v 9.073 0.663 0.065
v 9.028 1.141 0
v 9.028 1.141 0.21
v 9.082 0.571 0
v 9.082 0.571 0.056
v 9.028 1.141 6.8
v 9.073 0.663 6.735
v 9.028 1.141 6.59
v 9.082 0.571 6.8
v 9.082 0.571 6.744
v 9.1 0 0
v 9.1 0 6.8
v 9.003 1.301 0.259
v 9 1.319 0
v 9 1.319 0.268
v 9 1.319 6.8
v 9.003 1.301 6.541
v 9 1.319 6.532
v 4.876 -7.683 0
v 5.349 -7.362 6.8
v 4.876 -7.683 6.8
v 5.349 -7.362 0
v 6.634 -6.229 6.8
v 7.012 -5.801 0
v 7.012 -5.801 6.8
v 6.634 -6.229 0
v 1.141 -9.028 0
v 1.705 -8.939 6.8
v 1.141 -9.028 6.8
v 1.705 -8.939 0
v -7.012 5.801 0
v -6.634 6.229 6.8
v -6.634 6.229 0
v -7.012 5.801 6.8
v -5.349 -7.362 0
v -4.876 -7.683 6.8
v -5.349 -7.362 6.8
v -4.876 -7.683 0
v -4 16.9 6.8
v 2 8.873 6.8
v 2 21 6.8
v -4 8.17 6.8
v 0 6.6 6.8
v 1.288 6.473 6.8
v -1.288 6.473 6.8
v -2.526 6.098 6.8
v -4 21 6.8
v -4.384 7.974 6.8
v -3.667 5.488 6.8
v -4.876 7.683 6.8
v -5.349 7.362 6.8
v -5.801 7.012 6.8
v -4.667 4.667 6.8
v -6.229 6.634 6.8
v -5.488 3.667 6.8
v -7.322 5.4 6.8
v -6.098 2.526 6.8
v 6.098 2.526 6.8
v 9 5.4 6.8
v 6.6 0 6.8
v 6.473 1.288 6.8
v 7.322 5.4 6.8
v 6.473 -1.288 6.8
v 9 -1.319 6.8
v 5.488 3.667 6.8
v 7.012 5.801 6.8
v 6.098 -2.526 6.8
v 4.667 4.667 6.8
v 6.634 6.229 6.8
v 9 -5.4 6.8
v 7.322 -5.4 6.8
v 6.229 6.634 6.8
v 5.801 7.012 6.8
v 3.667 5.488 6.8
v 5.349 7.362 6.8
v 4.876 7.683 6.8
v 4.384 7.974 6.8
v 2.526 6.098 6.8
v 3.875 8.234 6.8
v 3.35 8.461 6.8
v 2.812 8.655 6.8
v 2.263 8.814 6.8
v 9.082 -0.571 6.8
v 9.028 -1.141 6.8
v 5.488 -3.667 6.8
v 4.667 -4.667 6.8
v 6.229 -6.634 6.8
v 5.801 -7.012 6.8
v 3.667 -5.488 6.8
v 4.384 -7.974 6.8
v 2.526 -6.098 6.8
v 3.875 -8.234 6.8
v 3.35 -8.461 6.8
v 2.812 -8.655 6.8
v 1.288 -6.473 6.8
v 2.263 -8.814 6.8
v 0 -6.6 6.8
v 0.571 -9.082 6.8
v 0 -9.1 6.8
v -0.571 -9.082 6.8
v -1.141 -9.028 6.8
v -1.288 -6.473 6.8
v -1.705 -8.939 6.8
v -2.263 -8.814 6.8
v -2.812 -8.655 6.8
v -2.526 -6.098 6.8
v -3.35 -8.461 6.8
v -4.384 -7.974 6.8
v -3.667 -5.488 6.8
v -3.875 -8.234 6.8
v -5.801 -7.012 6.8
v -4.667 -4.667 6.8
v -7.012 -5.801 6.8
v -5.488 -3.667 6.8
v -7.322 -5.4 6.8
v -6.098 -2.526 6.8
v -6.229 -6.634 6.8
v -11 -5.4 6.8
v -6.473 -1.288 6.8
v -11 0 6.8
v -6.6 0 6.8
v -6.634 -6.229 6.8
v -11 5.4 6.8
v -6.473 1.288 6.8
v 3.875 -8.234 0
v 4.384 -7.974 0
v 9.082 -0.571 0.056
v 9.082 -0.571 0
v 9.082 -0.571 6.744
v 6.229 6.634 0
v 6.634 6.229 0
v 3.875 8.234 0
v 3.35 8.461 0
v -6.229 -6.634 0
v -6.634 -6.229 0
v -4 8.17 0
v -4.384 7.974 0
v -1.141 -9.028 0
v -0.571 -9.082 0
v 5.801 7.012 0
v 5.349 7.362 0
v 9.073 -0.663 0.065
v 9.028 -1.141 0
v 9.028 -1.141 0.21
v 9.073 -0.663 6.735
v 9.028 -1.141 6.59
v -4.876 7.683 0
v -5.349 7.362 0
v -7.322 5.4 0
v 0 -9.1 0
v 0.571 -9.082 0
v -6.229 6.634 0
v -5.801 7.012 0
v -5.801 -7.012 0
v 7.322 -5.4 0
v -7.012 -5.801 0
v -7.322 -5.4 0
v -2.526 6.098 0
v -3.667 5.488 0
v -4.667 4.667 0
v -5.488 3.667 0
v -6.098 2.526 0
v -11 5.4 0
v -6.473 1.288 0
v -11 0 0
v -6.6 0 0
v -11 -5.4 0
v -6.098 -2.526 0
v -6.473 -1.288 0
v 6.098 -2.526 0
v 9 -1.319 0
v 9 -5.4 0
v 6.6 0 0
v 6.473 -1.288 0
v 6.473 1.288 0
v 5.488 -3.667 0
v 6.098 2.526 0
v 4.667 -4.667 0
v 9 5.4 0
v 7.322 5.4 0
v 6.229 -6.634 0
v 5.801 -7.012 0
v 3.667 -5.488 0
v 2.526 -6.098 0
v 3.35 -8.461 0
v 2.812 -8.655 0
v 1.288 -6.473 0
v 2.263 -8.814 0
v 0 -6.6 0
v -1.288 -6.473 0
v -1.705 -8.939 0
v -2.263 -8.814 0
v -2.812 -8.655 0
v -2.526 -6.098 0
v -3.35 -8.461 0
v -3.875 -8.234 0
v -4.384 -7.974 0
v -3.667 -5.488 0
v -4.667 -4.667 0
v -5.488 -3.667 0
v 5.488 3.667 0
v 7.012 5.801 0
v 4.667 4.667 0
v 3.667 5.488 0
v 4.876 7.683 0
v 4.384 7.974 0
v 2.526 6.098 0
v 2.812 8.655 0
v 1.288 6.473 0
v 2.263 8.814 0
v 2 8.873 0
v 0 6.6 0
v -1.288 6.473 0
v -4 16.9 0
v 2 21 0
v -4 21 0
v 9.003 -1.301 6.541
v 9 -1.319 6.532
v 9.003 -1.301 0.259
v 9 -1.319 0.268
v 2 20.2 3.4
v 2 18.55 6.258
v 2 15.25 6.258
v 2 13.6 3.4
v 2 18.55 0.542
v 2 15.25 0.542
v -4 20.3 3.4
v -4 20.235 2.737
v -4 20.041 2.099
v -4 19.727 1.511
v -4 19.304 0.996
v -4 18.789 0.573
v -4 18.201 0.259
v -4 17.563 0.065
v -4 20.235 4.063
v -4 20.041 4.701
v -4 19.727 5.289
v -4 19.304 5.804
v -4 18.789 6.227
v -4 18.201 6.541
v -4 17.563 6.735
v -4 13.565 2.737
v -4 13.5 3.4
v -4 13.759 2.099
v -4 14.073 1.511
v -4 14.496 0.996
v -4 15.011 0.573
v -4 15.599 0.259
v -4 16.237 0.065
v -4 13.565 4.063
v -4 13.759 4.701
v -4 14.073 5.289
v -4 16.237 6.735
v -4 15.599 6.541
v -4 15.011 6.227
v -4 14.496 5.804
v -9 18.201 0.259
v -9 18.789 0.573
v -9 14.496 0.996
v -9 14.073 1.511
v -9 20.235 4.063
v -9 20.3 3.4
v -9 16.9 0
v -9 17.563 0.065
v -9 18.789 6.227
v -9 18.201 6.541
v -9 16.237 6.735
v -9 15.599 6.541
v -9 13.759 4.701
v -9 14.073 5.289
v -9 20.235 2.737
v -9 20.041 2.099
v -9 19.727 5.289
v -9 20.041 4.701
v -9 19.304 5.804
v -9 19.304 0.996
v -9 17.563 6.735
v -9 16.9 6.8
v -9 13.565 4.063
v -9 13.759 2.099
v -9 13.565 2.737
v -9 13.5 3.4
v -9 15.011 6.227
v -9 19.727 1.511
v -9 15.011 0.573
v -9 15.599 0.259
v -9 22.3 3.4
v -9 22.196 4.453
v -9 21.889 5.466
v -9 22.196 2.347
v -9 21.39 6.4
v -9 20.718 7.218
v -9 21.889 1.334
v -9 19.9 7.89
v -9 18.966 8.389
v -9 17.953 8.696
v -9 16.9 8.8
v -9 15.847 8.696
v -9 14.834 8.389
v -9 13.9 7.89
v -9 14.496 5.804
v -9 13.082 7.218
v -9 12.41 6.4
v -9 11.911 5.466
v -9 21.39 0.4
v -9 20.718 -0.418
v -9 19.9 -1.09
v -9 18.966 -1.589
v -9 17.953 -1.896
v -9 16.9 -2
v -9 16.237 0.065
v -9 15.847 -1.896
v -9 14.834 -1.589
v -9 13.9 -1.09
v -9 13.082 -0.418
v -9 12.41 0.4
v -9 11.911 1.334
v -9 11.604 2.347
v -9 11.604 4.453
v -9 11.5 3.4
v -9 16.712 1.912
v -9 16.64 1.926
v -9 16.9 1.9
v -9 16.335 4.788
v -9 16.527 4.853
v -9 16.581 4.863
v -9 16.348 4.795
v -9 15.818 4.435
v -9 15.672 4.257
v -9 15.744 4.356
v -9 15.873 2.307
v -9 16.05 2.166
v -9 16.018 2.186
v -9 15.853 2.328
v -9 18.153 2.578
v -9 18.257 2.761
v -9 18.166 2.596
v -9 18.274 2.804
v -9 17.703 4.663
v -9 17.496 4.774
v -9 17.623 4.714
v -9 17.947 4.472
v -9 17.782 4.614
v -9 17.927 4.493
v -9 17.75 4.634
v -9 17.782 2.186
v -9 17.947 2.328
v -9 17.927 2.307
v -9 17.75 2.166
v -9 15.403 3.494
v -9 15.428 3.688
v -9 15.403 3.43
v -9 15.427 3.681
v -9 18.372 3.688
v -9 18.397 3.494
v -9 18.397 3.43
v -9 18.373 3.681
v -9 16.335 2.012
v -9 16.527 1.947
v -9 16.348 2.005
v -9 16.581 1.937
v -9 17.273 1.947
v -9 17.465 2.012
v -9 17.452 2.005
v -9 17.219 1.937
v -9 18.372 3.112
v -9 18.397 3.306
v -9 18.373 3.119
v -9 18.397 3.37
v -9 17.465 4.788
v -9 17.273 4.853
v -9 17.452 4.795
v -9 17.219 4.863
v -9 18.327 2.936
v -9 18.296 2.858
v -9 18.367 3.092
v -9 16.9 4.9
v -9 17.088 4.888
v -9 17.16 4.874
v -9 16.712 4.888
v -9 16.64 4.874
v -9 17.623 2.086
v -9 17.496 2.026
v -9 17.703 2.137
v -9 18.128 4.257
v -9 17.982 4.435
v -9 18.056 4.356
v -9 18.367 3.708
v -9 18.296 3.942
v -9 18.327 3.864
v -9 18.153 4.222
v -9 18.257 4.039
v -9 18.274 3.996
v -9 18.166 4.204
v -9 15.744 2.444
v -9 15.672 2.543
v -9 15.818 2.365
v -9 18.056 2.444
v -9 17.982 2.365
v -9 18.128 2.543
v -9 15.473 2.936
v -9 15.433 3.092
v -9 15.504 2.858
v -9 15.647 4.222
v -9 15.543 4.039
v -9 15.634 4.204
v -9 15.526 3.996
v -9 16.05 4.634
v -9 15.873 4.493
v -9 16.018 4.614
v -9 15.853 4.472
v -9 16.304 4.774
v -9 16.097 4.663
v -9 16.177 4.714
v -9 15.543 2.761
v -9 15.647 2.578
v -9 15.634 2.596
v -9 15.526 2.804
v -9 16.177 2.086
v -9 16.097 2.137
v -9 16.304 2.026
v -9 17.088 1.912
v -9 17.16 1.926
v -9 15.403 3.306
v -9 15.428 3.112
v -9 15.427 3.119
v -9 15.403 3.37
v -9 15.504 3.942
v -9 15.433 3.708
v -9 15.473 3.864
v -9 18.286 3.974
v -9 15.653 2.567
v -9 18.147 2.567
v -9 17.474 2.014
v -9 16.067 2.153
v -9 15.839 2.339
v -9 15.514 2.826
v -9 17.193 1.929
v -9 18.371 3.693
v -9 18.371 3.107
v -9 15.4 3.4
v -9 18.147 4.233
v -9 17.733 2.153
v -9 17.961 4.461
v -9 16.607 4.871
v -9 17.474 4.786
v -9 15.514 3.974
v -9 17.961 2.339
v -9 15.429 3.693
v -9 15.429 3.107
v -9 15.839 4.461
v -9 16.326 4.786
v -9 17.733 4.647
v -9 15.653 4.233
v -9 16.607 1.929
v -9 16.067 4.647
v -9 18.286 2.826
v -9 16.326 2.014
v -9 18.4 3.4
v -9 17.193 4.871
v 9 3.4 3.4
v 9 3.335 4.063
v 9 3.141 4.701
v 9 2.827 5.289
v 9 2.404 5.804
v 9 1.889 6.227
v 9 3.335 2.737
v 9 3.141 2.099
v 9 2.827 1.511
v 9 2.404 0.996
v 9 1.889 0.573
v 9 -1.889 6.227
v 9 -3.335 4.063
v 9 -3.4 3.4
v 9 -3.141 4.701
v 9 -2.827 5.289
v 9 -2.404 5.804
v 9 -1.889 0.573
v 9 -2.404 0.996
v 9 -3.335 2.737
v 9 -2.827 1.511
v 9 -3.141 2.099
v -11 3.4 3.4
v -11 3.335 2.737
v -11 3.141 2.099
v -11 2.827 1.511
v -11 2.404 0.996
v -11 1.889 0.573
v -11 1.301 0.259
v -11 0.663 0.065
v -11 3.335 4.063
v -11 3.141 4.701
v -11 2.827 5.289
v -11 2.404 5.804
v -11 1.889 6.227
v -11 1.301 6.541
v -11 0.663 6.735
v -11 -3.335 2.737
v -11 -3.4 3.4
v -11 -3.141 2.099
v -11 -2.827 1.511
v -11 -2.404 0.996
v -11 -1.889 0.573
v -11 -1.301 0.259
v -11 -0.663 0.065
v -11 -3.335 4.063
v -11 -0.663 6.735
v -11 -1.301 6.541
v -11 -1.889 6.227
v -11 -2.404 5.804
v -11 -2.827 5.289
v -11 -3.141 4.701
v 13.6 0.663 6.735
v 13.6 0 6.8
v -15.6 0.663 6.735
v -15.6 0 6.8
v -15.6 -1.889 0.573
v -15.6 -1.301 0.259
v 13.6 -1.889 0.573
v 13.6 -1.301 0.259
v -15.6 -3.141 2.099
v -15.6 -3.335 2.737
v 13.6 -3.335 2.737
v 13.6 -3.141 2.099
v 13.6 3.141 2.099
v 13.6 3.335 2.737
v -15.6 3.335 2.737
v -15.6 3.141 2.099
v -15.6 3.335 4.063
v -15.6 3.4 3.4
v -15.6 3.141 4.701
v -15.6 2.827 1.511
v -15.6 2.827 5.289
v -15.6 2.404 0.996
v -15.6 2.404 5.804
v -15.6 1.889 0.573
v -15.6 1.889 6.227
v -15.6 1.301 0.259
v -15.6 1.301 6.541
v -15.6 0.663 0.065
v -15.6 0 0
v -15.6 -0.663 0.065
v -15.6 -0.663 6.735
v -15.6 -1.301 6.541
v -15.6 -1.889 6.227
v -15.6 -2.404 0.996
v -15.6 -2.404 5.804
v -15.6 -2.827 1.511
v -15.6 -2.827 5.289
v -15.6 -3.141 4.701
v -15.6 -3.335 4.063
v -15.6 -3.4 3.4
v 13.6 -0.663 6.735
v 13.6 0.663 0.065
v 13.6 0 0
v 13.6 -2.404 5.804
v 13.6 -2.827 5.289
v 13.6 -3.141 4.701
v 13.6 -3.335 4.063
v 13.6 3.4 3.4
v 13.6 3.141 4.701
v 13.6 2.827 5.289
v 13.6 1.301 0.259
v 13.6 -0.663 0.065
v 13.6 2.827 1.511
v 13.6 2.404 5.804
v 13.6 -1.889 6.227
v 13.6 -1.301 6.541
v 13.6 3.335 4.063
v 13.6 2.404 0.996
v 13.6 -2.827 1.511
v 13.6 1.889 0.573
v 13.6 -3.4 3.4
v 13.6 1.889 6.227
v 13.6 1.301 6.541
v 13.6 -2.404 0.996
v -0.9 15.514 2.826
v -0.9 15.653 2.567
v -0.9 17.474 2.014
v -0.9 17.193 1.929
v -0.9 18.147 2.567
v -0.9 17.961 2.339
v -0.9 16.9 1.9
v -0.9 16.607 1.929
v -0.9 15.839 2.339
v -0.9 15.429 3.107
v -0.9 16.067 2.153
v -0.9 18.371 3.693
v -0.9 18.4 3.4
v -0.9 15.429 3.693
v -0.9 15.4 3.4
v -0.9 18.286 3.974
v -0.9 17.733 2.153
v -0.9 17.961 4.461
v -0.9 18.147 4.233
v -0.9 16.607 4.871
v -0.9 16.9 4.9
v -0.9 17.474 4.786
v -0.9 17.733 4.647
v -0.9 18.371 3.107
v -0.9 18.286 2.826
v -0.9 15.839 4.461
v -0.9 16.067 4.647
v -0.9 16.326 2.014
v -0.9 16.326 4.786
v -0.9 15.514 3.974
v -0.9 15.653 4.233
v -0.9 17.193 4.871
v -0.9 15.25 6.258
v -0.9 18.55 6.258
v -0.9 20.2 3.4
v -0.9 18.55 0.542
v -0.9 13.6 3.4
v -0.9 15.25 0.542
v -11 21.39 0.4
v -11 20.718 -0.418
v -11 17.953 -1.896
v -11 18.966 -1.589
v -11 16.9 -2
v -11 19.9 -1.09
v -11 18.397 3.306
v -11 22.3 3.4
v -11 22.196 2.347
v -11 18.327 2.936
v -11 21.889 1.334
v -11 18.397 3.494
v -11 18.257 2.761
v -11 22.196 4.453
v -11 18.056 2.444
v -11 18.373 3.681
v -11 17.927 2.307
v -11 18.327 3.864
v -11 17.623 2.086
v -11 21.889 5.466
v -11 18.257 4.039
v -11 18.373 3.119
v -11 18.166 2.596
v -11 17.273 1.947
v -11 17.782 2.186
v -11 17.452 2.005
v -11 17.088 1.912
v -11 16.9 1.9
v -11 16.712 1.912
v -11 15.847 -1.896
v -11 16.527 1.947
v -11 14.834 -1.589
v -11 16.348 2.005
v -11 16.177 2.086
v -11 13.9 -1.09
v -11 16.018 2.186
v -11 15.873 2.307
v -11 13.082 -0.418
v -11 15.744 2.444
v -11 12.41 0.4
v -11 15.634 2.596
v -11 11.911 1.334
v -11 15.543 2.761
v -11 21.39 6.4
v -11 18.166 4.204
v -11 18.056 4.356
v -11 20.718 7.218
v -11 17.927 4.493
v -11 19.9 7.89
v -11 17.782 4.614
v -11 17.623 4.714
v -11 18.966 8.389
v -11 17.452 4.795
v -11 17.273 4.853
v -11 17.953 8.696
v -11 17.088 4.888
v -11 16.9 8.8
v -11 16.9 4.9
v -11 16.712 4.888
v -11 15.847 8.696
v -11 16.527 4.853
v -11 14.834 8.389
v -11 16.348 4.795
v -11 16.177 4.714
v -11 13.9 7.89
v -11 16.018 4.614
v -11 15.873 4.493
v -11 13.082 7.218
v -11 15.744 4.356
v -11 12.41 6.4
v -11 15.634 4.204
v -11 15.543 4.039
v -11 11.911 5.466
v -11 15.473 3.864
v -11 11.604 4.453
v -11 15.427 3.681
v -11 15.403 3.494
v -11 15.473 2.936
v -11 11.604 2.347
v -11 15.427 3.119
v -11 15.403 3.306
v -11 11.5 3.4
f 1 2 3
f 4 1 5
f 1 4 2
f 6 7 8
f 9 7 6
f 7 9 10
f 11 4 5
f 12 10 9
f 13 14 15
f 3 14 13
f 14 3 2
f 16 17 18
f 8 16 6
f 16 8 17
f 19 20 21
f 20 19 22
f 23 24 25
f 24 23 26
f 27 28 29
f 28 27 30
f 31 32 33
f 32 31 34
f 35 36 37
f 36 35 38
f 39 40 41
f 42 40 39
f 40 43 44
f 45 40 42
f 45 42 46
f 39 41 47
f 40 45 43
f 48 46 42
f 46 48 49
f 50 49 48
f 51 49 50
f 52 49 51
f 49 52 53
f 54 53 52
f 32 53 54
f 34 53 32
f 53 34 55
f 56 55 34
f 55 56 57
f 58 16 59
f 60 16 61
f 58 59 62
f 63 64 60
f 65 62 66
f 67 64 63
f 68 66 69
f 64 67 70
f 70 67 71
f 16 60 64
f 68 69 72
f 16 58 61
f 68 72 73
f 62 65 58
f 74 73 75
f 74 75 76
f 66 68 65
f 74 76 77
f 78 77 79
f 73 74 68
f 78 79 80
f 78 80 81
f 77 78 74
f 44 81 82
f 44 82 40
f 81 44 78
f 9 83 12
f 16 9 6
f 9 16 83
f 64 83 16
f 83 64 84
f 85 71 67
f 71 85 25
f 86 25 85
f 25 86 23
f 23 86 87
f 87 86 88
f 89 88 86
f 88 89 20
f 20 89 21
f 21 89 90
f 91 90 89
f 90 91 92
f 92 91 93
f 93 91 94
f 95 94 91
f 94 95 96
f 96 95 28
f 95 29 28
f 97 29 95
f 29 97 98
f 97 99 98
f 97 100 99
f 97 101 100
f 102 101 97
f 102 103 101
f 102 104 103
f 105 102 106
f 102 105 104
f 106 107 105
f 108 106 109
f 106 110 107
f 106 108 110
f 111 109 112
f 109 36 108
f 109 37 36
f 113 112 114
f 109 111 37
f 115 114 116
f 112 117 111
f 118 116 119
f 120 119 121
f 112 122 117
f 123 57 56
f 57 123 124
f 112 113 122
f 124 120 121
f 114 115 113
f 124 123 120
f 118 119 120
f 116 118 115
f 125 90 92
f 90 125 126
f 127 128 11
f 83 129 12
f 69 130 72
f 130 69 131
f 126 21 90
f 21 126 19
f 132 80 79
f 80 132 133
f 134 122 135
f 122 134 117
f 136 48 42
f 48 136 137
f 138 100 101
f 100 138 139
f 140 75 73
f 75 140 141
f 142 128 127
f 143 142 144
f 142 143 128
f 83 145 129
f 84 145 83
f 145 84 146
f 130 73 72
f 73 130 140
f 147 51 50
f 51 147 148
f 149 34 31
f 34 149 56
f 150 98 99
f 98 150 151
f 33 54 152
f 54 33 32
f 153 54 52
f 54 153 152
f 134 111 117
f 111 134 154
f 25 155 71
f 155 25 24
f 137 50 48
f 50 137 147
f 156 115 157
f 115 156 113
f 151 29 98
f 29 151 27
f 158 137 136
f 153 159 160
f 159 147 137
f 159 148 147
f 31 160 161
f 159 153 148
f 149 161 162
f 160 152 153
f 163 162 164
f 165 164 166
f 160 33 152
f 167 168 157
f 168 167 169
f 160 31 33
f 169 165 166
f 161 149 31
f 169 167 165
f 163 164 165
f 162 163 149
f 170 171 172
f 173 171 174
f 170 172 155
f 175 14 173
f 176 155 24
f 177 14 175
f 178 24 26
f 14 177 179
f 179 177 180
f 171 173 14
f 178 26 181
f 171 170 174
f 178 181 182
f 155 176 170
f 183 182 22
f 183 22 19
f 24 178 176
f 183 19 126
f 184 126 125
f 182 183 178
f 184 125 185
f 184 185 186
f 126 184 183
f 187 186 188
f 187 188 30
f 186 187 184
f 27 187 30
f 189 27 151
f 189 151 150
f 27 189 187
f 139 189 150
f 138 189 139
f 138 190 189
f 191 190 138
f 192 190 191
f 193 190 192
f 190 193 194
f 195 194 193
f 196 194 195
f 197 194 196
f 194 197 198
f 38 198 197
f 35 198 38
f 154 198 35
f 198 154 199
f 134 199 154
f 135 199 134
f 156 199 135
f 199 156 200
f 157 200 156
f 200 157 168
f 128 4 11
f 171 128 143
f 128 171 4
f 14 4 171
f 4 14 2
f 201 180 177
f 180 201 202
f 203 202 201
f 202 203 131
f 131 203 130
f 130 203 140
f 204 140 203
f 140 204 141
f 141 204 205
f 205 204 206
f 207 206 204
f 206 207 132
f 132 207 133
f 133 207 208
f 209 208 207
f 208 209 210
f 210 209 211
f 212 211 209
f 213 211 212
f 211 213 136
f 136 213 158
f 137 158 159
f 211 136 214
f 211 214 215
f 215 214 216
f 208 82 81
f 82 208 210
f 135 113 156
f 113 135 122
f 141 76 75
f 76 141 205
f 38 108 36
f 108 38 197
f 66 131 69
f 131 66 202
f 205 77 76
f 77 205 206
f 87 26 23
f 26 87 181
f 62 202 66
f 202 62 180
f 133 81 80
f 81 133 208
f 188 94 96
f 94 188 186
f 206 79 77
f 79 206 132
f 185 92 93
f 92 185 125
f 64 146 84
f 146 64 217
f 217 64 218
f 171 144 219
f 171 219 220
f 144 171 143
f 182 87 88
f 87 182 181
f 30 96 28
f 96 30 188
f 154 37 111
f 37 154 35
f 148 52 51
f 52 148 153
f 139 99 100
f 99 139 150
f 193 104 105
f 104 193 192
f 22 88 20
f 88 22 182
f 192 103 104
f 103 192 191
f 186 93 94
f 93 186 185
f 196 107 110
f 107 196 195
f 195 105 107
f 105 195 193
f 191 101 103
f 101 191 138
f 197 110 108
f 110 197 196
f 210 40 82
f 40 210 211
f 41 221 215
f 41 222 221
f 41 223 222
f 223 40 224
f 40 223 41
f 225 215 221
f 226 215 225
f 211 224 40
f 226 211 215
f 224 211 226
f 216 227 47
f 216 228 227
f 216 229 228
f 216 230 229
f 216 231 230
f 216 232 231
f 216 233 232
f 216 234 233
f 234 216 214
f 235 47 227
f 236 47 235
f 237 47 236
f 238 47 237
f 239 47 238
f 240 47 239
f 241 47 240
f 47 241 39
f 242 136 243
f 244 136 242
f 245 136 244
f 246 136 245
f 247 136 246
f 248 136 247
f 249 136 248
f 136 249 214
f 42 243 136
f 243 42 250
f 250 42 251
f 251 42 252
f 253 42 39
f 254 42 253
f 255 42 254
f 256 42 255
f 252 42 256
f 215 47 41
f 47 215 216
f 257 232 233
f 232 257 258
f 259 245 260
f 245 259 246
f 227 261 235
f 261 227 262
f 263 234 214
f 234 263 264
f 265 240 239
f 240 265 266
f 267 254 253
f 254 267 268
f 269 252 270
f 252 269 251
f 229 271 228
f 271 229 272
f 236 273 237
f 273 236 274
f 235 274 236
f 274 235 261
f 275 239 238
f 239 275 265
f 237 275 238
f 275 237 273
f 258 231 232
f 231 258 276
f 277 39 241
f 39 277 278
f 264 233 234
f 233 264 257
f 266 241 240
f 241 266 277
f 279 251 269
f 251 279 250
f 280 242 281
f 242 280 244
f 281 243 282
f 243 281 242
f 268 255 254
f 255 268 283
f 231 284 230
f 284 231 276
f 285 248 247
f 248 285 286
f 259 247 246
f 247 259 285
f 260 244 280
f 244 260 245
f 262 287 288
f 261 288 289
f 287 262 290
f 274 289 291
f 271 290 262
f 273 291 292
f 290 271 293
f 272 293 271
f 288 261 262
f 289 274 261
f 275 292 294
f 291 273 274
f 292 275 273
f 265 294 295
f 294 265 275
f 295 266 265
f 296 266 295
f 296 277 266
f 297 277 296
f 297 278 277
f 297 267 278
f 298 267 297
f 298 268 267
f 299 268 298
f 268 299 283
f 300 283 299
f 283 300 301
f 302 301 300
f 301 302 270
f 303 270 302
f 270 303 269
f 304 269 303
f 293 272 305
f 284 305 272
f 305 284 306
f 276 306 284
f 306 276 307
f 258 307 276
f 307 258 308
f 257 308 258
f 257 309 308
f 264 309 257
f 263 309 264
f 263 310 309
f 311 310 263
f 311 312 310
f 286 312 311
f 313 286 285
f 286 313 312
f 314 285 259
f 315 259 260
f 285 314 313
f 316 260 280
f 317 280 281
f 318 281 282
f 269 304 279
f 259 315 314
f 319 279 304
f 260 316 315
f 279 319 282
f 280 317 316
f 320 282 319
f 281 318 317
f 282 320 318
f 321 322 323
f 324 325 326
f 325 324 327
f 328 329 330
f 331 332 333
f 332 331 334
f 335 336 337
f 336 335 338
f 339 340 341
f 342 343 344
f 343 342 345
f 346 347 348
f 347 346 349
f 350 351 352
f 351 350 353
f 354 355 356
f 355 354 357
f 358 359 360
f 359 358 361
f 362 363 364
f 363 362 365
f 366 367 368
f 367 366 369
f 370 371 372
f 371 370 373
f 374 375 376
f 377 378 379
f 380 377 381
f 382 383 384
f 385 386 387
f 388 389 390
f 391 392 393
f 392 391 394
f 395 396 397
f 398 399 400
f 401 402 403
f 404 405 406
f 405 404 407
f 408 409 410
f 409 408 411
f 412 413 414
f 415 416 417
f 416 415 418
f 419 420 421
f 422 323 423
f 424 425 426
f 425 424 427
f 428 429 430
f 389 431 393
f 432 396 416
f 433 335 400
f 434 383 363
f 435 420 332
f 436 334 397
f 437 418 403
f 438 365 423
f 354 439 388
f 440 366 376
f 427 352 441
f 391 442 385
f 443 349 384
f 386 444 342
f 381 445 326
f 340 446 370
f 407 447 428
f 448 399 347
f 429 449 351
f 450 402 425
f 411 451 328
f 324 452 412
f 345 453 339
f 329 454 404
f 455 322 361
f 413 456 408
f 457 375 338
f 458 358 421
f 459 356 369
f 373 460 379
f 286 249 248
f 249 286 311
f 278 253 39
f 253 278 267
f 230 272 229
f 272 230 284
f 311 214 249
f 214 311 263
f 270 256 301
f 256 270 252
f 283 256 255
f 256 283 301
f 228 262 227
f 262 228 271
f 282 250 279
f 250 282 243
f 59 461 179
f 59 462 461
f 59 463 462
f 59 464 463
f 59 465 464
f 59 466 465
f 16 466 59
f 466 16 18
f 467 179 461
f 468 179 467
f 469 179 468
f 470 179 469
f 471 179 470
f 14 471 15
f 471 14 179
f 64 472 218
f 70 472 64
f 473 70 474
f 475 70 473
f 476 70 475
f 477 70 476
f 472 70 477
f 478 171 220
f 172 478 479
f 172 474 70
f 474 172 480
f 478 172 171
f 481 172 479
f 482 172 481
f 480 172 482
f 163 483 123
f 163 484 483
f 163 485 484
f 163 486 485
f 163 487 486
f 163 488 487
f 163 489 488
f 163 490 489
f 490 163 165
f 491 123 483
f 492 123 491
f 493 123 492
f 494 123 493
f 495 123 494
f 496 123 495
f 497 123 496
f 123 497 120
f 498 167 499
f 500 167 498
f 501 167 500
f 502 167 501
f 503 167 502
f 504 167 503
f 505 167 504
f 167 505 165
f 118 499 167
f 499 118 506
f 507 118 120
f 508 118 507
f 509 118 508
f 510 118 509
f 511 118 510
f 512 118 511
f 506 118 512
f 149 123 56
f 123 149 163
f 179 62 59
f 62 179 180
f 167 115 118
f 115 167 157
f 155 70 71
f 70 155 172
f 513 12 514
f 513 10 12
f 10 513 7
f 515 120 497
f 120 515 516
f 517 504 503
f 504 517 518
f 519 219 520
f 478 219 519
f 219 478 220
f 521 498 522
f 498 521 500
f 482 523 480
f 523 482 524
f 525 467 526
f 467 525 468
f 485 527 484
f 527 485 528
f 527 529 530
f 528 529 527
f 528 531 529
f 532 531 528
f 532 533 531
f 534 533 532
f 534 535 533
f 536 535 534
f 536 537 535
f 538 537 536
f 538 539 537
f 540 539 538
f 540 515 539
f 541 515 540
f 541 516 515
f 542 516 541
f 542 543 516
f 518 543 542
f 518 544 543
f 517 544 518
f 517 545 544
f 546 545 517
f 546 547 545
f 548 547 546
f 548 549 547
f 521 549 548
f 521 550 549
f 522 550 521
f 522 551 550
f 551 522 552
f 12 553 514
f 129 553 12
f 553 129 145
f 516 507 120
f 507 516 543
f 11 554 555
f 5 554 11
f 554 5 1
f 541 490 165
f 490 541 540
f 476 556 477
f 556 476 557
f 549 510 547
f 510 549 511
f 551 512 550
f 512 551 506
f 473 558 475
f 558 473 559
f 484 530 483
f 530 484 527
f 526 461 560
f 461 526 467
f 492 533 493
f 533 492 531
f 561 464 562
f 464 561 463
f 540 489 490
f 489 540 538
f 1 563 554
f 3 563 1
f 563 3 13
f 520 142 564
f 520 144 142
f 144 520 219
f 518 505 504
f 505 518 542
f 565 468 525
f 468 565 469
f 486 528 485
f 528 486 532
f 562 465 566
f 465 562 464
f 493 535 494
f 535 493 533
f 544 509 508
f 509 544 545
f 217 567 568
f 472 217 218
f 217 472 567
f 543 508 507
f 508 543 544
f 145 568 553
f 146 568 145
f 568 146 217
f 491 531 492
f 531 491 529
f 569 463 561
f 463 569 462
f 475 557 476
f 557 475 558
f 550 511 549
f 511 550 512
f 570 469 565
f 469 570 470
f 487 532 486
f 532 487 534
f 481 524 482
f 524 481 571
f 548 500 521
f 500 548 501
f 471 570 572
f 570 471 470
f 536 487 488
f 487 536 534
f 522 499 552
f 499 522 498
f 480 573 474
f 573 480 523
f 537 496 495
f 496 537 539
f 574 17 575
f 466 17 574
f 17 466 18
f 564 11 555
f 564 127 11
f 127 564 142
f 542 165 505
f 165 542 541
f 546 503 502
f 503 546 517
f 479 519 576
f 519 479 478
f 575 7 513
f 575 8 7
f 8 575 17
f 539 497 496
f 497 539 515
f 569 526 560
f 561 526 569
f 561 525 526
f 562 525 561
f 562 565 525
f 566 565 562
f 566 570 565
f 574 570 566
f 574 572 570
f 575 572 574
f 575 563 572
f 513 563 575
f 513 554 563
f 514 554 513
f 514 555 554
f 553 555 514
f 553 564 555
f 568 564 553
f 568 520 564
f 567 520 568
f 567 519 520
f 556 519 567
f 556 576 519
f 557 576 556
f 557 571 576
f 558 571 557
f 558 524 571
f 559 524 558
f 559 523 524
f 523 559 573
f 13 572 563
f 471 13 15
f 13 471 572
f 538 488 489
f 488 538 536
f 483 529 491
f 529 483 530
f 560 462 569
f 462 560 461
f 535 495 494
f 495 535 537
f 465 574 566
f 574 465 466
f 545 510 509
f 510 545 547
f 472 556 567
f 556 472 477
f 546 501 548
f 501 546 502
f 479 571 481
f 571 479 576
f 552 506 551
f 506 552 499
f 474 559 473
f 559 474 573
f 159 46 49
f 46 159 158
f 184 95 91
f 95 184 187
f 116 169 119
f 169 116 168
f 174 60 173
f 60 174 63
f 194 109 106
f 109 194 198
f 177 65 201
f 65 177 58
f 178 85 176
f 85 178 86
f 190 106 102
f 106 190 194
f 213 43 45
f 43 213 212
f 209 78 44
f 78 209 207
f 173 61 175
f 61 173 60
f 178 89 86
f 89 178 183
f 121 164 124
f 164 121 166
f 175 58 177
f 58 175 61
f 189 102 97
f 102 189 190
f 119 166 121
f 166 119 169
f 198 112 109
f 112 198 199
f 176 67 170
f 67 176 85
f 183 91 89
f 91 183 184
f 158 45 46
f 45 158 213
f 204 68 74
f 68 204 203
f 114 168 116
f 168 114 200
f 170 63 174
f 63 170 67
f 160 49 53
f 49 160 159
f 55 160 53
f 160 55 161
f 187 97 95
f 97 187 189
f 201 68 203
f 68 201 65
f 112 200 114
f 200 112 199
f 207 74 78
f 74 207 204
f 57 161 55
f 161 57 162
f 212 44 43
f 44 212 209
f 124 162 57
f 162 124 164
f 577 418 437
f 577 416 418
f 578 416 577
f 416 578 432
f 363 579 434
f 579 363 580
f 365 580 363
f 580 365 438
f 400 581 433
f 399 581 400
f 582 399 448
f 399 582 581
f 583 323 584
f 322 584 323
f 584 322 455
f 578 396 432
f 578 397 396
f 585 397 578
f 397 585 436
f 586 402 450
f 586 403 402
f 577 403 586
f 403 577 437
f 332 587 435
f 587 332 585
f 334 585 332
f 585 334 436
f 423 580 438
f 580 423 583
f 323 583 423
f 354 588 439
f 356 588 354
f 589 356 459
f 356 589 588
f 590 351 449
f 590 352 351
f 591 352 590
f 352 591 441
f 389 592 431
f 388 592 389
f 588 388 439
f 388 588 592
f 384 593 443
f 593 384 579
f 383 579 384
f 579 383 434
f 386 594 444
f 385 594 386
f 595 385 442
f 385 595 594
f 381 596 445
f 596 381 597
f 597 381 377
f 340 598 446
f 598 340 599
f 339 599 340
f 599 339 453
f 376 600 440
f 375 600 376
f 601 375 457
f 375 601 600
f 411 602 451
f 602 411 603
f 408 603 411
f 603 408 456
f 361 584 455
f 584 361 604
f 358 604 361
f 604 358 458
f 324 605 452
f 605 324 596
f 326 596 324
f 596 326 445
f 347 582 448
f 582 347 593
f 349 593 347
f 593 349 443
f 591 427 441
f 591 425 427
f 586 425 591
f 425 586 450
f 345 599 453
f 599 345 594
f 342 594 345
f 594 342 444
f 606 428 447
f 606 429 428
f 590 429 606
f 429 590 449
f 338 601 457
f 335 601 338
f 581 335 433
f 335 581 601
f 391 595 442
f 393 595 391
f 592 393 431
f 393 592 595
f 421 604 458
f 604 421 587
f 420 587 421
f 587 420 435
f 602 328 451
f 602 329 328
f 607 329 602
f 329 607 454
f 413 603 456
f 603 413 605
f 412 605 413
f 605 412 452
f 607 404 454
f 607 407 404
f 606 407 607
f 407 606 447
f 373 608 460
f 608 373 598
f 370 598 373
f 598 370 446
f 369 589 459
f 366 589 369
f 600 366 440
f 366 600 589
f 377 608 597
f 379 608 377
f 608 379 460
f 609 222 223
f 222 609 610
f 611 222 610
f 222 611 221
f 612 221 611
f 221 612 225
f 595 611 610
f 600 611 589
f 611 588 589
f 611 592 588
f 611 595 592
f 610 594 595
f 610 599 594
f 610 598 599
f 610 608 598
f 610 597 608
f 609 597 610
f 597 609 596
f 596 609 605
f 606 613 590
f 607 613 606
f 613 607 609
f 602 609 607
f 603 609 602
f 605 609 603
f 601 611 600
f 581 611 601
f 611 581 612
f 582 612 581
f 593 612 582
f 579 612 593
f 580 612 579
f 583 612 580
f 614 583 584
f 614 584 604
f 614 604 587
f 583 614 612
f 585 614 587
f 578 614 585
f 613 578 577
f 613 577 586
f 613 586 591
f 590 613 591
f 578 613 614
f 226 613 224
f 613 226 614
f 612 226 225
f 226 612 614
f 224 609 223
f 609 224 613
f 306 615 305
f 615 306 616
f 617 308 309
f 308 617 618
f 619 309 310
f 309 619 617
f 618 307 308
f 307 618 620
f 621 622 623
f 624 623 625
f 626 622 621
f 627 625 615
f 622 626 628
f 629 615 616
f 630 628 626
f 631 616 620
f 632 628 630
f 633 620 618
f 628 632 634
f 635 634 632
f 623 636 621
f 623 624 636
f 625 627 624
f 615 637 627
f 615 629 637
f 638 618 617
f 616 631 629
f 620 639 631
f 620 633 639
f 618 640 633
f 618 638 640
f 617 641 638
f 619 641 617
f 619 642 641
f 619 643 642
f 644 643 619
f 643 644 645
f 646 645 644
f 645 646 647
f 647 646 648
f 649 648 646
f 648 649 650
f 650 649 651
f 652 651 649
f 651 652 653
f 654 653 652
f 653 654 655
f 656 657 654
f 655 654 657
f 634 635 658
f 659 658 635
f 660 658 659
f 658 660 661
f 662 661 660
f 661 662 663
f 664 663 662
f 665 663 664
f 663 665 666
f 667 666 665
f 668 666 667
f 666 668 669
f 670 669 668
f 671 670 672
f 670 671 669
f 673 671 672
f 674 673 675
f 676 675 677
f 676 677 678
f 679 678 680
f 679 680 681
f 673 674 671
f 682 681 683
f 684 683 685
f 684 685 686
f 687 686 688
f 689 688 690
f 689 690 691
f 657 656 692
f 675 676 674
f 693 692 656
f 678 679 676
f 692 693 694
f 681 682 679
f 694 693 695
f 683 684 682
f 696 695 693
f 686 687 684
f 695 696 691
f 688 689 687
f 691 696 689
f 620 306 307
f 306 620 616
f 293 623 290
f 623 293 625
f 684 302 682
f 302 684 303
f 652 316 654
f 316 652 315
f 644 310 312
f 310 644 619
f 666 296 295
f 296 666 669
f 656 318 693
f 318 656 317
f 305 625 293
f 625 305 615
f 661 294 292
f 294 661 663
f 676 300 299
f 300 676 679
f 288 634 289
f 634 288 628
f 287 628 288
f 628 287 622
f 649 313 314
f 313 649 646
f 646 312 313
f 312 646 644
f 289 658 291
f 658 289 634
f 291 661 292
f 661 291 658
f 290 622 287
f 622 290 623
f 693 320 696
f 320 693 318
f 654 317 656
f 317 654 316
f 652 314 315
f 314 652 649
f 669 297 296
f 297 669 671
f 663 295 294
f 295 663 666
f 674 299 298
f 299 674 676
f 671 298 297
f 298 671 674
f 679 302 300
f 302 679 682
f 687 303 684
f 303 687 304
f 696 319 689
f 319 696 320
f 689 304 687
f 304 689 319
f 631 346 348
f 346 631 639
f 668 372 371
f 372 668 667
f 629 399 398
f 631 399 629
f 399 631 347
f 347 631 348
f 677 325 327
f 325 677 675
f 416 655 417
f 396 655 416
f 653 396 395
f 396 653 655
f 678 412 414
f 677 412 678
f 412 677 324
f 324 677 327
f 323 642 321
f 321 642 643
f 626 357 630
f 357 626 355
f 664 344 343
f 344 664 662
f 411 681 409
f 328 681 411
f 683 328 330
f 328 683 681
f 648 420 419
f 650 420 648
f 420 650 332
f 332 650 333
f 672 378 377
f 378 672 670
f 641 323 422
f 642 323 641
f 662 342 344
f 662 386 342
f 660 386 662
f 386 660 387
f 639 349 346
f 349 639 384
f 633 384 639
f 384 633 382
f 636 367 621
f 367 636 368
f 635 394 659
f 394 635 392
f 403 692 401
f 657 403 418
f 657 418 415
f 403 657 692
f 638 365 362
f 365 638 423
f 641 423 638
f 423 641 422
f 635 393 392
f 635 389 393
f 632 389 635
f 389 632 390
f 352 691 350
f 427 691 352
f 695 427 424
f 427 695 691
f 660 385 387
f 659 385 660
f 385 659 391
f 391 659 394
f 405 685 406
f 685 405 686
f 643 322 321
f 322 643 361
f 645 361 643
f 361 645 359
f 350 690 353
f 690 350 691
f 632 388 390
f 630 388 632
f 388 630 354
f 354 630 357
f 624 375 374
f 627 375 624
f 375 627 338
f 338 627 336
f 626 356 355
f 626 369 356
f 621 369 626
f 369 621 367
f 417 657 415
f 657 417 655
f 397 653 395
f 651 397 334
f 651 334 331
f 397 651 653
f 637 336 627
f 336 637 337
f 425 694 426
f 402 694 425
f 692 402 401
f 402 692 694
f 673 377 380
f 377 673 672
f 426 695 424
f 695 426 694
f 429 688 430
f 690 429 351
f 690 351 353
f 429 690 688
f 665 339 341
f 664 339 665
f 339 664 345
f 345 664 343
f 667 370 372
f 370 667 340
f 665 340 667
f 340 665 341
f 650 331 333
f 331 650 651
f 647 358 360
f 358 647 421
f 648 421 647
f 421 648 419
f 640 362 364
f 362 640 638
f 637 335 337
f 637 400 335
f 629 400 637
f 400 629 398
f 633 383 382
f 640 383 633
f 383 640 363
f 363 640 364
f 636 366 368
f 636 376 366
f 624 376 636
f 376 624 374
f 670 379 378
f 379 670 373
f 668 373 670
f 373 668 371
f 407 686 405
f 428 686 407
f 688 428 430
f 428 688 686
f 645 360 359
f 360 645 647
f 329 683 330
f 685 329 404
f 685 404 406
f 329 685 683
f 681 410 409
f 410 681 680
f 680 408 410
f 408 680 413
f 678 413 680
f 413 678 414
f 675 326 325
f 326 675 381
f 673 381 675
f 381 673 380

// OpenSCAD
w=6.8;
h = w;
d = 13.2;
os = (d+6); //offset

part();
lid();

module part() {
    difference() {
        union() {
            cylinder($fn=100, d=d+5, h=h);
            
            //arm
            translate([-4,0,0]) cube([6,21,h]);
            /*hull() {
                translate([-1,21-w/2,0]) cylinder($fn=50, d=6, h=h);
                translate([-4,0,0]) cube([3.6,20.6,h]);
                translate([-4+3.6,7,0]) cube([2.4,2,h]);
            }*/
            translate([-9,13.5+w/2,w/2]) rotate([0,90,0]) cylinder($fn=32, d=w, h=5);
            
            //support
            d1 = w+2*2;
            translate([-11,-d1/2,0]) cube([20,d1,h]);
            translate([-os/2-5-1,0,w/2]) rotate([0,90,0]) cylinder($fn=32, d=w, h=os+2*5);
        }
        color("red") {
            cylinder($fn=32, d=d, h=h);
            translate([-9,13.5+w/2,w/2]) rotate([0,90,0]) cylinder($fn=32, d=3, h=5+6);
            translate([-0.9,13.5+w/2,w/2]) rotate([0,90,0]) rotate([0,0,90]) cylinder($fn=6, d=6.6, h=3);
        }
    }
}

module lid() {
    translate([-9-2,13.5+w/2,w/2]) rotate([0,90,0]) 
    difference() {
        color("grey") cylinder($fn=32, d=w+4, h=2);
        color("red") cylinder($fn=50, d=3, h=2);
    }
}
